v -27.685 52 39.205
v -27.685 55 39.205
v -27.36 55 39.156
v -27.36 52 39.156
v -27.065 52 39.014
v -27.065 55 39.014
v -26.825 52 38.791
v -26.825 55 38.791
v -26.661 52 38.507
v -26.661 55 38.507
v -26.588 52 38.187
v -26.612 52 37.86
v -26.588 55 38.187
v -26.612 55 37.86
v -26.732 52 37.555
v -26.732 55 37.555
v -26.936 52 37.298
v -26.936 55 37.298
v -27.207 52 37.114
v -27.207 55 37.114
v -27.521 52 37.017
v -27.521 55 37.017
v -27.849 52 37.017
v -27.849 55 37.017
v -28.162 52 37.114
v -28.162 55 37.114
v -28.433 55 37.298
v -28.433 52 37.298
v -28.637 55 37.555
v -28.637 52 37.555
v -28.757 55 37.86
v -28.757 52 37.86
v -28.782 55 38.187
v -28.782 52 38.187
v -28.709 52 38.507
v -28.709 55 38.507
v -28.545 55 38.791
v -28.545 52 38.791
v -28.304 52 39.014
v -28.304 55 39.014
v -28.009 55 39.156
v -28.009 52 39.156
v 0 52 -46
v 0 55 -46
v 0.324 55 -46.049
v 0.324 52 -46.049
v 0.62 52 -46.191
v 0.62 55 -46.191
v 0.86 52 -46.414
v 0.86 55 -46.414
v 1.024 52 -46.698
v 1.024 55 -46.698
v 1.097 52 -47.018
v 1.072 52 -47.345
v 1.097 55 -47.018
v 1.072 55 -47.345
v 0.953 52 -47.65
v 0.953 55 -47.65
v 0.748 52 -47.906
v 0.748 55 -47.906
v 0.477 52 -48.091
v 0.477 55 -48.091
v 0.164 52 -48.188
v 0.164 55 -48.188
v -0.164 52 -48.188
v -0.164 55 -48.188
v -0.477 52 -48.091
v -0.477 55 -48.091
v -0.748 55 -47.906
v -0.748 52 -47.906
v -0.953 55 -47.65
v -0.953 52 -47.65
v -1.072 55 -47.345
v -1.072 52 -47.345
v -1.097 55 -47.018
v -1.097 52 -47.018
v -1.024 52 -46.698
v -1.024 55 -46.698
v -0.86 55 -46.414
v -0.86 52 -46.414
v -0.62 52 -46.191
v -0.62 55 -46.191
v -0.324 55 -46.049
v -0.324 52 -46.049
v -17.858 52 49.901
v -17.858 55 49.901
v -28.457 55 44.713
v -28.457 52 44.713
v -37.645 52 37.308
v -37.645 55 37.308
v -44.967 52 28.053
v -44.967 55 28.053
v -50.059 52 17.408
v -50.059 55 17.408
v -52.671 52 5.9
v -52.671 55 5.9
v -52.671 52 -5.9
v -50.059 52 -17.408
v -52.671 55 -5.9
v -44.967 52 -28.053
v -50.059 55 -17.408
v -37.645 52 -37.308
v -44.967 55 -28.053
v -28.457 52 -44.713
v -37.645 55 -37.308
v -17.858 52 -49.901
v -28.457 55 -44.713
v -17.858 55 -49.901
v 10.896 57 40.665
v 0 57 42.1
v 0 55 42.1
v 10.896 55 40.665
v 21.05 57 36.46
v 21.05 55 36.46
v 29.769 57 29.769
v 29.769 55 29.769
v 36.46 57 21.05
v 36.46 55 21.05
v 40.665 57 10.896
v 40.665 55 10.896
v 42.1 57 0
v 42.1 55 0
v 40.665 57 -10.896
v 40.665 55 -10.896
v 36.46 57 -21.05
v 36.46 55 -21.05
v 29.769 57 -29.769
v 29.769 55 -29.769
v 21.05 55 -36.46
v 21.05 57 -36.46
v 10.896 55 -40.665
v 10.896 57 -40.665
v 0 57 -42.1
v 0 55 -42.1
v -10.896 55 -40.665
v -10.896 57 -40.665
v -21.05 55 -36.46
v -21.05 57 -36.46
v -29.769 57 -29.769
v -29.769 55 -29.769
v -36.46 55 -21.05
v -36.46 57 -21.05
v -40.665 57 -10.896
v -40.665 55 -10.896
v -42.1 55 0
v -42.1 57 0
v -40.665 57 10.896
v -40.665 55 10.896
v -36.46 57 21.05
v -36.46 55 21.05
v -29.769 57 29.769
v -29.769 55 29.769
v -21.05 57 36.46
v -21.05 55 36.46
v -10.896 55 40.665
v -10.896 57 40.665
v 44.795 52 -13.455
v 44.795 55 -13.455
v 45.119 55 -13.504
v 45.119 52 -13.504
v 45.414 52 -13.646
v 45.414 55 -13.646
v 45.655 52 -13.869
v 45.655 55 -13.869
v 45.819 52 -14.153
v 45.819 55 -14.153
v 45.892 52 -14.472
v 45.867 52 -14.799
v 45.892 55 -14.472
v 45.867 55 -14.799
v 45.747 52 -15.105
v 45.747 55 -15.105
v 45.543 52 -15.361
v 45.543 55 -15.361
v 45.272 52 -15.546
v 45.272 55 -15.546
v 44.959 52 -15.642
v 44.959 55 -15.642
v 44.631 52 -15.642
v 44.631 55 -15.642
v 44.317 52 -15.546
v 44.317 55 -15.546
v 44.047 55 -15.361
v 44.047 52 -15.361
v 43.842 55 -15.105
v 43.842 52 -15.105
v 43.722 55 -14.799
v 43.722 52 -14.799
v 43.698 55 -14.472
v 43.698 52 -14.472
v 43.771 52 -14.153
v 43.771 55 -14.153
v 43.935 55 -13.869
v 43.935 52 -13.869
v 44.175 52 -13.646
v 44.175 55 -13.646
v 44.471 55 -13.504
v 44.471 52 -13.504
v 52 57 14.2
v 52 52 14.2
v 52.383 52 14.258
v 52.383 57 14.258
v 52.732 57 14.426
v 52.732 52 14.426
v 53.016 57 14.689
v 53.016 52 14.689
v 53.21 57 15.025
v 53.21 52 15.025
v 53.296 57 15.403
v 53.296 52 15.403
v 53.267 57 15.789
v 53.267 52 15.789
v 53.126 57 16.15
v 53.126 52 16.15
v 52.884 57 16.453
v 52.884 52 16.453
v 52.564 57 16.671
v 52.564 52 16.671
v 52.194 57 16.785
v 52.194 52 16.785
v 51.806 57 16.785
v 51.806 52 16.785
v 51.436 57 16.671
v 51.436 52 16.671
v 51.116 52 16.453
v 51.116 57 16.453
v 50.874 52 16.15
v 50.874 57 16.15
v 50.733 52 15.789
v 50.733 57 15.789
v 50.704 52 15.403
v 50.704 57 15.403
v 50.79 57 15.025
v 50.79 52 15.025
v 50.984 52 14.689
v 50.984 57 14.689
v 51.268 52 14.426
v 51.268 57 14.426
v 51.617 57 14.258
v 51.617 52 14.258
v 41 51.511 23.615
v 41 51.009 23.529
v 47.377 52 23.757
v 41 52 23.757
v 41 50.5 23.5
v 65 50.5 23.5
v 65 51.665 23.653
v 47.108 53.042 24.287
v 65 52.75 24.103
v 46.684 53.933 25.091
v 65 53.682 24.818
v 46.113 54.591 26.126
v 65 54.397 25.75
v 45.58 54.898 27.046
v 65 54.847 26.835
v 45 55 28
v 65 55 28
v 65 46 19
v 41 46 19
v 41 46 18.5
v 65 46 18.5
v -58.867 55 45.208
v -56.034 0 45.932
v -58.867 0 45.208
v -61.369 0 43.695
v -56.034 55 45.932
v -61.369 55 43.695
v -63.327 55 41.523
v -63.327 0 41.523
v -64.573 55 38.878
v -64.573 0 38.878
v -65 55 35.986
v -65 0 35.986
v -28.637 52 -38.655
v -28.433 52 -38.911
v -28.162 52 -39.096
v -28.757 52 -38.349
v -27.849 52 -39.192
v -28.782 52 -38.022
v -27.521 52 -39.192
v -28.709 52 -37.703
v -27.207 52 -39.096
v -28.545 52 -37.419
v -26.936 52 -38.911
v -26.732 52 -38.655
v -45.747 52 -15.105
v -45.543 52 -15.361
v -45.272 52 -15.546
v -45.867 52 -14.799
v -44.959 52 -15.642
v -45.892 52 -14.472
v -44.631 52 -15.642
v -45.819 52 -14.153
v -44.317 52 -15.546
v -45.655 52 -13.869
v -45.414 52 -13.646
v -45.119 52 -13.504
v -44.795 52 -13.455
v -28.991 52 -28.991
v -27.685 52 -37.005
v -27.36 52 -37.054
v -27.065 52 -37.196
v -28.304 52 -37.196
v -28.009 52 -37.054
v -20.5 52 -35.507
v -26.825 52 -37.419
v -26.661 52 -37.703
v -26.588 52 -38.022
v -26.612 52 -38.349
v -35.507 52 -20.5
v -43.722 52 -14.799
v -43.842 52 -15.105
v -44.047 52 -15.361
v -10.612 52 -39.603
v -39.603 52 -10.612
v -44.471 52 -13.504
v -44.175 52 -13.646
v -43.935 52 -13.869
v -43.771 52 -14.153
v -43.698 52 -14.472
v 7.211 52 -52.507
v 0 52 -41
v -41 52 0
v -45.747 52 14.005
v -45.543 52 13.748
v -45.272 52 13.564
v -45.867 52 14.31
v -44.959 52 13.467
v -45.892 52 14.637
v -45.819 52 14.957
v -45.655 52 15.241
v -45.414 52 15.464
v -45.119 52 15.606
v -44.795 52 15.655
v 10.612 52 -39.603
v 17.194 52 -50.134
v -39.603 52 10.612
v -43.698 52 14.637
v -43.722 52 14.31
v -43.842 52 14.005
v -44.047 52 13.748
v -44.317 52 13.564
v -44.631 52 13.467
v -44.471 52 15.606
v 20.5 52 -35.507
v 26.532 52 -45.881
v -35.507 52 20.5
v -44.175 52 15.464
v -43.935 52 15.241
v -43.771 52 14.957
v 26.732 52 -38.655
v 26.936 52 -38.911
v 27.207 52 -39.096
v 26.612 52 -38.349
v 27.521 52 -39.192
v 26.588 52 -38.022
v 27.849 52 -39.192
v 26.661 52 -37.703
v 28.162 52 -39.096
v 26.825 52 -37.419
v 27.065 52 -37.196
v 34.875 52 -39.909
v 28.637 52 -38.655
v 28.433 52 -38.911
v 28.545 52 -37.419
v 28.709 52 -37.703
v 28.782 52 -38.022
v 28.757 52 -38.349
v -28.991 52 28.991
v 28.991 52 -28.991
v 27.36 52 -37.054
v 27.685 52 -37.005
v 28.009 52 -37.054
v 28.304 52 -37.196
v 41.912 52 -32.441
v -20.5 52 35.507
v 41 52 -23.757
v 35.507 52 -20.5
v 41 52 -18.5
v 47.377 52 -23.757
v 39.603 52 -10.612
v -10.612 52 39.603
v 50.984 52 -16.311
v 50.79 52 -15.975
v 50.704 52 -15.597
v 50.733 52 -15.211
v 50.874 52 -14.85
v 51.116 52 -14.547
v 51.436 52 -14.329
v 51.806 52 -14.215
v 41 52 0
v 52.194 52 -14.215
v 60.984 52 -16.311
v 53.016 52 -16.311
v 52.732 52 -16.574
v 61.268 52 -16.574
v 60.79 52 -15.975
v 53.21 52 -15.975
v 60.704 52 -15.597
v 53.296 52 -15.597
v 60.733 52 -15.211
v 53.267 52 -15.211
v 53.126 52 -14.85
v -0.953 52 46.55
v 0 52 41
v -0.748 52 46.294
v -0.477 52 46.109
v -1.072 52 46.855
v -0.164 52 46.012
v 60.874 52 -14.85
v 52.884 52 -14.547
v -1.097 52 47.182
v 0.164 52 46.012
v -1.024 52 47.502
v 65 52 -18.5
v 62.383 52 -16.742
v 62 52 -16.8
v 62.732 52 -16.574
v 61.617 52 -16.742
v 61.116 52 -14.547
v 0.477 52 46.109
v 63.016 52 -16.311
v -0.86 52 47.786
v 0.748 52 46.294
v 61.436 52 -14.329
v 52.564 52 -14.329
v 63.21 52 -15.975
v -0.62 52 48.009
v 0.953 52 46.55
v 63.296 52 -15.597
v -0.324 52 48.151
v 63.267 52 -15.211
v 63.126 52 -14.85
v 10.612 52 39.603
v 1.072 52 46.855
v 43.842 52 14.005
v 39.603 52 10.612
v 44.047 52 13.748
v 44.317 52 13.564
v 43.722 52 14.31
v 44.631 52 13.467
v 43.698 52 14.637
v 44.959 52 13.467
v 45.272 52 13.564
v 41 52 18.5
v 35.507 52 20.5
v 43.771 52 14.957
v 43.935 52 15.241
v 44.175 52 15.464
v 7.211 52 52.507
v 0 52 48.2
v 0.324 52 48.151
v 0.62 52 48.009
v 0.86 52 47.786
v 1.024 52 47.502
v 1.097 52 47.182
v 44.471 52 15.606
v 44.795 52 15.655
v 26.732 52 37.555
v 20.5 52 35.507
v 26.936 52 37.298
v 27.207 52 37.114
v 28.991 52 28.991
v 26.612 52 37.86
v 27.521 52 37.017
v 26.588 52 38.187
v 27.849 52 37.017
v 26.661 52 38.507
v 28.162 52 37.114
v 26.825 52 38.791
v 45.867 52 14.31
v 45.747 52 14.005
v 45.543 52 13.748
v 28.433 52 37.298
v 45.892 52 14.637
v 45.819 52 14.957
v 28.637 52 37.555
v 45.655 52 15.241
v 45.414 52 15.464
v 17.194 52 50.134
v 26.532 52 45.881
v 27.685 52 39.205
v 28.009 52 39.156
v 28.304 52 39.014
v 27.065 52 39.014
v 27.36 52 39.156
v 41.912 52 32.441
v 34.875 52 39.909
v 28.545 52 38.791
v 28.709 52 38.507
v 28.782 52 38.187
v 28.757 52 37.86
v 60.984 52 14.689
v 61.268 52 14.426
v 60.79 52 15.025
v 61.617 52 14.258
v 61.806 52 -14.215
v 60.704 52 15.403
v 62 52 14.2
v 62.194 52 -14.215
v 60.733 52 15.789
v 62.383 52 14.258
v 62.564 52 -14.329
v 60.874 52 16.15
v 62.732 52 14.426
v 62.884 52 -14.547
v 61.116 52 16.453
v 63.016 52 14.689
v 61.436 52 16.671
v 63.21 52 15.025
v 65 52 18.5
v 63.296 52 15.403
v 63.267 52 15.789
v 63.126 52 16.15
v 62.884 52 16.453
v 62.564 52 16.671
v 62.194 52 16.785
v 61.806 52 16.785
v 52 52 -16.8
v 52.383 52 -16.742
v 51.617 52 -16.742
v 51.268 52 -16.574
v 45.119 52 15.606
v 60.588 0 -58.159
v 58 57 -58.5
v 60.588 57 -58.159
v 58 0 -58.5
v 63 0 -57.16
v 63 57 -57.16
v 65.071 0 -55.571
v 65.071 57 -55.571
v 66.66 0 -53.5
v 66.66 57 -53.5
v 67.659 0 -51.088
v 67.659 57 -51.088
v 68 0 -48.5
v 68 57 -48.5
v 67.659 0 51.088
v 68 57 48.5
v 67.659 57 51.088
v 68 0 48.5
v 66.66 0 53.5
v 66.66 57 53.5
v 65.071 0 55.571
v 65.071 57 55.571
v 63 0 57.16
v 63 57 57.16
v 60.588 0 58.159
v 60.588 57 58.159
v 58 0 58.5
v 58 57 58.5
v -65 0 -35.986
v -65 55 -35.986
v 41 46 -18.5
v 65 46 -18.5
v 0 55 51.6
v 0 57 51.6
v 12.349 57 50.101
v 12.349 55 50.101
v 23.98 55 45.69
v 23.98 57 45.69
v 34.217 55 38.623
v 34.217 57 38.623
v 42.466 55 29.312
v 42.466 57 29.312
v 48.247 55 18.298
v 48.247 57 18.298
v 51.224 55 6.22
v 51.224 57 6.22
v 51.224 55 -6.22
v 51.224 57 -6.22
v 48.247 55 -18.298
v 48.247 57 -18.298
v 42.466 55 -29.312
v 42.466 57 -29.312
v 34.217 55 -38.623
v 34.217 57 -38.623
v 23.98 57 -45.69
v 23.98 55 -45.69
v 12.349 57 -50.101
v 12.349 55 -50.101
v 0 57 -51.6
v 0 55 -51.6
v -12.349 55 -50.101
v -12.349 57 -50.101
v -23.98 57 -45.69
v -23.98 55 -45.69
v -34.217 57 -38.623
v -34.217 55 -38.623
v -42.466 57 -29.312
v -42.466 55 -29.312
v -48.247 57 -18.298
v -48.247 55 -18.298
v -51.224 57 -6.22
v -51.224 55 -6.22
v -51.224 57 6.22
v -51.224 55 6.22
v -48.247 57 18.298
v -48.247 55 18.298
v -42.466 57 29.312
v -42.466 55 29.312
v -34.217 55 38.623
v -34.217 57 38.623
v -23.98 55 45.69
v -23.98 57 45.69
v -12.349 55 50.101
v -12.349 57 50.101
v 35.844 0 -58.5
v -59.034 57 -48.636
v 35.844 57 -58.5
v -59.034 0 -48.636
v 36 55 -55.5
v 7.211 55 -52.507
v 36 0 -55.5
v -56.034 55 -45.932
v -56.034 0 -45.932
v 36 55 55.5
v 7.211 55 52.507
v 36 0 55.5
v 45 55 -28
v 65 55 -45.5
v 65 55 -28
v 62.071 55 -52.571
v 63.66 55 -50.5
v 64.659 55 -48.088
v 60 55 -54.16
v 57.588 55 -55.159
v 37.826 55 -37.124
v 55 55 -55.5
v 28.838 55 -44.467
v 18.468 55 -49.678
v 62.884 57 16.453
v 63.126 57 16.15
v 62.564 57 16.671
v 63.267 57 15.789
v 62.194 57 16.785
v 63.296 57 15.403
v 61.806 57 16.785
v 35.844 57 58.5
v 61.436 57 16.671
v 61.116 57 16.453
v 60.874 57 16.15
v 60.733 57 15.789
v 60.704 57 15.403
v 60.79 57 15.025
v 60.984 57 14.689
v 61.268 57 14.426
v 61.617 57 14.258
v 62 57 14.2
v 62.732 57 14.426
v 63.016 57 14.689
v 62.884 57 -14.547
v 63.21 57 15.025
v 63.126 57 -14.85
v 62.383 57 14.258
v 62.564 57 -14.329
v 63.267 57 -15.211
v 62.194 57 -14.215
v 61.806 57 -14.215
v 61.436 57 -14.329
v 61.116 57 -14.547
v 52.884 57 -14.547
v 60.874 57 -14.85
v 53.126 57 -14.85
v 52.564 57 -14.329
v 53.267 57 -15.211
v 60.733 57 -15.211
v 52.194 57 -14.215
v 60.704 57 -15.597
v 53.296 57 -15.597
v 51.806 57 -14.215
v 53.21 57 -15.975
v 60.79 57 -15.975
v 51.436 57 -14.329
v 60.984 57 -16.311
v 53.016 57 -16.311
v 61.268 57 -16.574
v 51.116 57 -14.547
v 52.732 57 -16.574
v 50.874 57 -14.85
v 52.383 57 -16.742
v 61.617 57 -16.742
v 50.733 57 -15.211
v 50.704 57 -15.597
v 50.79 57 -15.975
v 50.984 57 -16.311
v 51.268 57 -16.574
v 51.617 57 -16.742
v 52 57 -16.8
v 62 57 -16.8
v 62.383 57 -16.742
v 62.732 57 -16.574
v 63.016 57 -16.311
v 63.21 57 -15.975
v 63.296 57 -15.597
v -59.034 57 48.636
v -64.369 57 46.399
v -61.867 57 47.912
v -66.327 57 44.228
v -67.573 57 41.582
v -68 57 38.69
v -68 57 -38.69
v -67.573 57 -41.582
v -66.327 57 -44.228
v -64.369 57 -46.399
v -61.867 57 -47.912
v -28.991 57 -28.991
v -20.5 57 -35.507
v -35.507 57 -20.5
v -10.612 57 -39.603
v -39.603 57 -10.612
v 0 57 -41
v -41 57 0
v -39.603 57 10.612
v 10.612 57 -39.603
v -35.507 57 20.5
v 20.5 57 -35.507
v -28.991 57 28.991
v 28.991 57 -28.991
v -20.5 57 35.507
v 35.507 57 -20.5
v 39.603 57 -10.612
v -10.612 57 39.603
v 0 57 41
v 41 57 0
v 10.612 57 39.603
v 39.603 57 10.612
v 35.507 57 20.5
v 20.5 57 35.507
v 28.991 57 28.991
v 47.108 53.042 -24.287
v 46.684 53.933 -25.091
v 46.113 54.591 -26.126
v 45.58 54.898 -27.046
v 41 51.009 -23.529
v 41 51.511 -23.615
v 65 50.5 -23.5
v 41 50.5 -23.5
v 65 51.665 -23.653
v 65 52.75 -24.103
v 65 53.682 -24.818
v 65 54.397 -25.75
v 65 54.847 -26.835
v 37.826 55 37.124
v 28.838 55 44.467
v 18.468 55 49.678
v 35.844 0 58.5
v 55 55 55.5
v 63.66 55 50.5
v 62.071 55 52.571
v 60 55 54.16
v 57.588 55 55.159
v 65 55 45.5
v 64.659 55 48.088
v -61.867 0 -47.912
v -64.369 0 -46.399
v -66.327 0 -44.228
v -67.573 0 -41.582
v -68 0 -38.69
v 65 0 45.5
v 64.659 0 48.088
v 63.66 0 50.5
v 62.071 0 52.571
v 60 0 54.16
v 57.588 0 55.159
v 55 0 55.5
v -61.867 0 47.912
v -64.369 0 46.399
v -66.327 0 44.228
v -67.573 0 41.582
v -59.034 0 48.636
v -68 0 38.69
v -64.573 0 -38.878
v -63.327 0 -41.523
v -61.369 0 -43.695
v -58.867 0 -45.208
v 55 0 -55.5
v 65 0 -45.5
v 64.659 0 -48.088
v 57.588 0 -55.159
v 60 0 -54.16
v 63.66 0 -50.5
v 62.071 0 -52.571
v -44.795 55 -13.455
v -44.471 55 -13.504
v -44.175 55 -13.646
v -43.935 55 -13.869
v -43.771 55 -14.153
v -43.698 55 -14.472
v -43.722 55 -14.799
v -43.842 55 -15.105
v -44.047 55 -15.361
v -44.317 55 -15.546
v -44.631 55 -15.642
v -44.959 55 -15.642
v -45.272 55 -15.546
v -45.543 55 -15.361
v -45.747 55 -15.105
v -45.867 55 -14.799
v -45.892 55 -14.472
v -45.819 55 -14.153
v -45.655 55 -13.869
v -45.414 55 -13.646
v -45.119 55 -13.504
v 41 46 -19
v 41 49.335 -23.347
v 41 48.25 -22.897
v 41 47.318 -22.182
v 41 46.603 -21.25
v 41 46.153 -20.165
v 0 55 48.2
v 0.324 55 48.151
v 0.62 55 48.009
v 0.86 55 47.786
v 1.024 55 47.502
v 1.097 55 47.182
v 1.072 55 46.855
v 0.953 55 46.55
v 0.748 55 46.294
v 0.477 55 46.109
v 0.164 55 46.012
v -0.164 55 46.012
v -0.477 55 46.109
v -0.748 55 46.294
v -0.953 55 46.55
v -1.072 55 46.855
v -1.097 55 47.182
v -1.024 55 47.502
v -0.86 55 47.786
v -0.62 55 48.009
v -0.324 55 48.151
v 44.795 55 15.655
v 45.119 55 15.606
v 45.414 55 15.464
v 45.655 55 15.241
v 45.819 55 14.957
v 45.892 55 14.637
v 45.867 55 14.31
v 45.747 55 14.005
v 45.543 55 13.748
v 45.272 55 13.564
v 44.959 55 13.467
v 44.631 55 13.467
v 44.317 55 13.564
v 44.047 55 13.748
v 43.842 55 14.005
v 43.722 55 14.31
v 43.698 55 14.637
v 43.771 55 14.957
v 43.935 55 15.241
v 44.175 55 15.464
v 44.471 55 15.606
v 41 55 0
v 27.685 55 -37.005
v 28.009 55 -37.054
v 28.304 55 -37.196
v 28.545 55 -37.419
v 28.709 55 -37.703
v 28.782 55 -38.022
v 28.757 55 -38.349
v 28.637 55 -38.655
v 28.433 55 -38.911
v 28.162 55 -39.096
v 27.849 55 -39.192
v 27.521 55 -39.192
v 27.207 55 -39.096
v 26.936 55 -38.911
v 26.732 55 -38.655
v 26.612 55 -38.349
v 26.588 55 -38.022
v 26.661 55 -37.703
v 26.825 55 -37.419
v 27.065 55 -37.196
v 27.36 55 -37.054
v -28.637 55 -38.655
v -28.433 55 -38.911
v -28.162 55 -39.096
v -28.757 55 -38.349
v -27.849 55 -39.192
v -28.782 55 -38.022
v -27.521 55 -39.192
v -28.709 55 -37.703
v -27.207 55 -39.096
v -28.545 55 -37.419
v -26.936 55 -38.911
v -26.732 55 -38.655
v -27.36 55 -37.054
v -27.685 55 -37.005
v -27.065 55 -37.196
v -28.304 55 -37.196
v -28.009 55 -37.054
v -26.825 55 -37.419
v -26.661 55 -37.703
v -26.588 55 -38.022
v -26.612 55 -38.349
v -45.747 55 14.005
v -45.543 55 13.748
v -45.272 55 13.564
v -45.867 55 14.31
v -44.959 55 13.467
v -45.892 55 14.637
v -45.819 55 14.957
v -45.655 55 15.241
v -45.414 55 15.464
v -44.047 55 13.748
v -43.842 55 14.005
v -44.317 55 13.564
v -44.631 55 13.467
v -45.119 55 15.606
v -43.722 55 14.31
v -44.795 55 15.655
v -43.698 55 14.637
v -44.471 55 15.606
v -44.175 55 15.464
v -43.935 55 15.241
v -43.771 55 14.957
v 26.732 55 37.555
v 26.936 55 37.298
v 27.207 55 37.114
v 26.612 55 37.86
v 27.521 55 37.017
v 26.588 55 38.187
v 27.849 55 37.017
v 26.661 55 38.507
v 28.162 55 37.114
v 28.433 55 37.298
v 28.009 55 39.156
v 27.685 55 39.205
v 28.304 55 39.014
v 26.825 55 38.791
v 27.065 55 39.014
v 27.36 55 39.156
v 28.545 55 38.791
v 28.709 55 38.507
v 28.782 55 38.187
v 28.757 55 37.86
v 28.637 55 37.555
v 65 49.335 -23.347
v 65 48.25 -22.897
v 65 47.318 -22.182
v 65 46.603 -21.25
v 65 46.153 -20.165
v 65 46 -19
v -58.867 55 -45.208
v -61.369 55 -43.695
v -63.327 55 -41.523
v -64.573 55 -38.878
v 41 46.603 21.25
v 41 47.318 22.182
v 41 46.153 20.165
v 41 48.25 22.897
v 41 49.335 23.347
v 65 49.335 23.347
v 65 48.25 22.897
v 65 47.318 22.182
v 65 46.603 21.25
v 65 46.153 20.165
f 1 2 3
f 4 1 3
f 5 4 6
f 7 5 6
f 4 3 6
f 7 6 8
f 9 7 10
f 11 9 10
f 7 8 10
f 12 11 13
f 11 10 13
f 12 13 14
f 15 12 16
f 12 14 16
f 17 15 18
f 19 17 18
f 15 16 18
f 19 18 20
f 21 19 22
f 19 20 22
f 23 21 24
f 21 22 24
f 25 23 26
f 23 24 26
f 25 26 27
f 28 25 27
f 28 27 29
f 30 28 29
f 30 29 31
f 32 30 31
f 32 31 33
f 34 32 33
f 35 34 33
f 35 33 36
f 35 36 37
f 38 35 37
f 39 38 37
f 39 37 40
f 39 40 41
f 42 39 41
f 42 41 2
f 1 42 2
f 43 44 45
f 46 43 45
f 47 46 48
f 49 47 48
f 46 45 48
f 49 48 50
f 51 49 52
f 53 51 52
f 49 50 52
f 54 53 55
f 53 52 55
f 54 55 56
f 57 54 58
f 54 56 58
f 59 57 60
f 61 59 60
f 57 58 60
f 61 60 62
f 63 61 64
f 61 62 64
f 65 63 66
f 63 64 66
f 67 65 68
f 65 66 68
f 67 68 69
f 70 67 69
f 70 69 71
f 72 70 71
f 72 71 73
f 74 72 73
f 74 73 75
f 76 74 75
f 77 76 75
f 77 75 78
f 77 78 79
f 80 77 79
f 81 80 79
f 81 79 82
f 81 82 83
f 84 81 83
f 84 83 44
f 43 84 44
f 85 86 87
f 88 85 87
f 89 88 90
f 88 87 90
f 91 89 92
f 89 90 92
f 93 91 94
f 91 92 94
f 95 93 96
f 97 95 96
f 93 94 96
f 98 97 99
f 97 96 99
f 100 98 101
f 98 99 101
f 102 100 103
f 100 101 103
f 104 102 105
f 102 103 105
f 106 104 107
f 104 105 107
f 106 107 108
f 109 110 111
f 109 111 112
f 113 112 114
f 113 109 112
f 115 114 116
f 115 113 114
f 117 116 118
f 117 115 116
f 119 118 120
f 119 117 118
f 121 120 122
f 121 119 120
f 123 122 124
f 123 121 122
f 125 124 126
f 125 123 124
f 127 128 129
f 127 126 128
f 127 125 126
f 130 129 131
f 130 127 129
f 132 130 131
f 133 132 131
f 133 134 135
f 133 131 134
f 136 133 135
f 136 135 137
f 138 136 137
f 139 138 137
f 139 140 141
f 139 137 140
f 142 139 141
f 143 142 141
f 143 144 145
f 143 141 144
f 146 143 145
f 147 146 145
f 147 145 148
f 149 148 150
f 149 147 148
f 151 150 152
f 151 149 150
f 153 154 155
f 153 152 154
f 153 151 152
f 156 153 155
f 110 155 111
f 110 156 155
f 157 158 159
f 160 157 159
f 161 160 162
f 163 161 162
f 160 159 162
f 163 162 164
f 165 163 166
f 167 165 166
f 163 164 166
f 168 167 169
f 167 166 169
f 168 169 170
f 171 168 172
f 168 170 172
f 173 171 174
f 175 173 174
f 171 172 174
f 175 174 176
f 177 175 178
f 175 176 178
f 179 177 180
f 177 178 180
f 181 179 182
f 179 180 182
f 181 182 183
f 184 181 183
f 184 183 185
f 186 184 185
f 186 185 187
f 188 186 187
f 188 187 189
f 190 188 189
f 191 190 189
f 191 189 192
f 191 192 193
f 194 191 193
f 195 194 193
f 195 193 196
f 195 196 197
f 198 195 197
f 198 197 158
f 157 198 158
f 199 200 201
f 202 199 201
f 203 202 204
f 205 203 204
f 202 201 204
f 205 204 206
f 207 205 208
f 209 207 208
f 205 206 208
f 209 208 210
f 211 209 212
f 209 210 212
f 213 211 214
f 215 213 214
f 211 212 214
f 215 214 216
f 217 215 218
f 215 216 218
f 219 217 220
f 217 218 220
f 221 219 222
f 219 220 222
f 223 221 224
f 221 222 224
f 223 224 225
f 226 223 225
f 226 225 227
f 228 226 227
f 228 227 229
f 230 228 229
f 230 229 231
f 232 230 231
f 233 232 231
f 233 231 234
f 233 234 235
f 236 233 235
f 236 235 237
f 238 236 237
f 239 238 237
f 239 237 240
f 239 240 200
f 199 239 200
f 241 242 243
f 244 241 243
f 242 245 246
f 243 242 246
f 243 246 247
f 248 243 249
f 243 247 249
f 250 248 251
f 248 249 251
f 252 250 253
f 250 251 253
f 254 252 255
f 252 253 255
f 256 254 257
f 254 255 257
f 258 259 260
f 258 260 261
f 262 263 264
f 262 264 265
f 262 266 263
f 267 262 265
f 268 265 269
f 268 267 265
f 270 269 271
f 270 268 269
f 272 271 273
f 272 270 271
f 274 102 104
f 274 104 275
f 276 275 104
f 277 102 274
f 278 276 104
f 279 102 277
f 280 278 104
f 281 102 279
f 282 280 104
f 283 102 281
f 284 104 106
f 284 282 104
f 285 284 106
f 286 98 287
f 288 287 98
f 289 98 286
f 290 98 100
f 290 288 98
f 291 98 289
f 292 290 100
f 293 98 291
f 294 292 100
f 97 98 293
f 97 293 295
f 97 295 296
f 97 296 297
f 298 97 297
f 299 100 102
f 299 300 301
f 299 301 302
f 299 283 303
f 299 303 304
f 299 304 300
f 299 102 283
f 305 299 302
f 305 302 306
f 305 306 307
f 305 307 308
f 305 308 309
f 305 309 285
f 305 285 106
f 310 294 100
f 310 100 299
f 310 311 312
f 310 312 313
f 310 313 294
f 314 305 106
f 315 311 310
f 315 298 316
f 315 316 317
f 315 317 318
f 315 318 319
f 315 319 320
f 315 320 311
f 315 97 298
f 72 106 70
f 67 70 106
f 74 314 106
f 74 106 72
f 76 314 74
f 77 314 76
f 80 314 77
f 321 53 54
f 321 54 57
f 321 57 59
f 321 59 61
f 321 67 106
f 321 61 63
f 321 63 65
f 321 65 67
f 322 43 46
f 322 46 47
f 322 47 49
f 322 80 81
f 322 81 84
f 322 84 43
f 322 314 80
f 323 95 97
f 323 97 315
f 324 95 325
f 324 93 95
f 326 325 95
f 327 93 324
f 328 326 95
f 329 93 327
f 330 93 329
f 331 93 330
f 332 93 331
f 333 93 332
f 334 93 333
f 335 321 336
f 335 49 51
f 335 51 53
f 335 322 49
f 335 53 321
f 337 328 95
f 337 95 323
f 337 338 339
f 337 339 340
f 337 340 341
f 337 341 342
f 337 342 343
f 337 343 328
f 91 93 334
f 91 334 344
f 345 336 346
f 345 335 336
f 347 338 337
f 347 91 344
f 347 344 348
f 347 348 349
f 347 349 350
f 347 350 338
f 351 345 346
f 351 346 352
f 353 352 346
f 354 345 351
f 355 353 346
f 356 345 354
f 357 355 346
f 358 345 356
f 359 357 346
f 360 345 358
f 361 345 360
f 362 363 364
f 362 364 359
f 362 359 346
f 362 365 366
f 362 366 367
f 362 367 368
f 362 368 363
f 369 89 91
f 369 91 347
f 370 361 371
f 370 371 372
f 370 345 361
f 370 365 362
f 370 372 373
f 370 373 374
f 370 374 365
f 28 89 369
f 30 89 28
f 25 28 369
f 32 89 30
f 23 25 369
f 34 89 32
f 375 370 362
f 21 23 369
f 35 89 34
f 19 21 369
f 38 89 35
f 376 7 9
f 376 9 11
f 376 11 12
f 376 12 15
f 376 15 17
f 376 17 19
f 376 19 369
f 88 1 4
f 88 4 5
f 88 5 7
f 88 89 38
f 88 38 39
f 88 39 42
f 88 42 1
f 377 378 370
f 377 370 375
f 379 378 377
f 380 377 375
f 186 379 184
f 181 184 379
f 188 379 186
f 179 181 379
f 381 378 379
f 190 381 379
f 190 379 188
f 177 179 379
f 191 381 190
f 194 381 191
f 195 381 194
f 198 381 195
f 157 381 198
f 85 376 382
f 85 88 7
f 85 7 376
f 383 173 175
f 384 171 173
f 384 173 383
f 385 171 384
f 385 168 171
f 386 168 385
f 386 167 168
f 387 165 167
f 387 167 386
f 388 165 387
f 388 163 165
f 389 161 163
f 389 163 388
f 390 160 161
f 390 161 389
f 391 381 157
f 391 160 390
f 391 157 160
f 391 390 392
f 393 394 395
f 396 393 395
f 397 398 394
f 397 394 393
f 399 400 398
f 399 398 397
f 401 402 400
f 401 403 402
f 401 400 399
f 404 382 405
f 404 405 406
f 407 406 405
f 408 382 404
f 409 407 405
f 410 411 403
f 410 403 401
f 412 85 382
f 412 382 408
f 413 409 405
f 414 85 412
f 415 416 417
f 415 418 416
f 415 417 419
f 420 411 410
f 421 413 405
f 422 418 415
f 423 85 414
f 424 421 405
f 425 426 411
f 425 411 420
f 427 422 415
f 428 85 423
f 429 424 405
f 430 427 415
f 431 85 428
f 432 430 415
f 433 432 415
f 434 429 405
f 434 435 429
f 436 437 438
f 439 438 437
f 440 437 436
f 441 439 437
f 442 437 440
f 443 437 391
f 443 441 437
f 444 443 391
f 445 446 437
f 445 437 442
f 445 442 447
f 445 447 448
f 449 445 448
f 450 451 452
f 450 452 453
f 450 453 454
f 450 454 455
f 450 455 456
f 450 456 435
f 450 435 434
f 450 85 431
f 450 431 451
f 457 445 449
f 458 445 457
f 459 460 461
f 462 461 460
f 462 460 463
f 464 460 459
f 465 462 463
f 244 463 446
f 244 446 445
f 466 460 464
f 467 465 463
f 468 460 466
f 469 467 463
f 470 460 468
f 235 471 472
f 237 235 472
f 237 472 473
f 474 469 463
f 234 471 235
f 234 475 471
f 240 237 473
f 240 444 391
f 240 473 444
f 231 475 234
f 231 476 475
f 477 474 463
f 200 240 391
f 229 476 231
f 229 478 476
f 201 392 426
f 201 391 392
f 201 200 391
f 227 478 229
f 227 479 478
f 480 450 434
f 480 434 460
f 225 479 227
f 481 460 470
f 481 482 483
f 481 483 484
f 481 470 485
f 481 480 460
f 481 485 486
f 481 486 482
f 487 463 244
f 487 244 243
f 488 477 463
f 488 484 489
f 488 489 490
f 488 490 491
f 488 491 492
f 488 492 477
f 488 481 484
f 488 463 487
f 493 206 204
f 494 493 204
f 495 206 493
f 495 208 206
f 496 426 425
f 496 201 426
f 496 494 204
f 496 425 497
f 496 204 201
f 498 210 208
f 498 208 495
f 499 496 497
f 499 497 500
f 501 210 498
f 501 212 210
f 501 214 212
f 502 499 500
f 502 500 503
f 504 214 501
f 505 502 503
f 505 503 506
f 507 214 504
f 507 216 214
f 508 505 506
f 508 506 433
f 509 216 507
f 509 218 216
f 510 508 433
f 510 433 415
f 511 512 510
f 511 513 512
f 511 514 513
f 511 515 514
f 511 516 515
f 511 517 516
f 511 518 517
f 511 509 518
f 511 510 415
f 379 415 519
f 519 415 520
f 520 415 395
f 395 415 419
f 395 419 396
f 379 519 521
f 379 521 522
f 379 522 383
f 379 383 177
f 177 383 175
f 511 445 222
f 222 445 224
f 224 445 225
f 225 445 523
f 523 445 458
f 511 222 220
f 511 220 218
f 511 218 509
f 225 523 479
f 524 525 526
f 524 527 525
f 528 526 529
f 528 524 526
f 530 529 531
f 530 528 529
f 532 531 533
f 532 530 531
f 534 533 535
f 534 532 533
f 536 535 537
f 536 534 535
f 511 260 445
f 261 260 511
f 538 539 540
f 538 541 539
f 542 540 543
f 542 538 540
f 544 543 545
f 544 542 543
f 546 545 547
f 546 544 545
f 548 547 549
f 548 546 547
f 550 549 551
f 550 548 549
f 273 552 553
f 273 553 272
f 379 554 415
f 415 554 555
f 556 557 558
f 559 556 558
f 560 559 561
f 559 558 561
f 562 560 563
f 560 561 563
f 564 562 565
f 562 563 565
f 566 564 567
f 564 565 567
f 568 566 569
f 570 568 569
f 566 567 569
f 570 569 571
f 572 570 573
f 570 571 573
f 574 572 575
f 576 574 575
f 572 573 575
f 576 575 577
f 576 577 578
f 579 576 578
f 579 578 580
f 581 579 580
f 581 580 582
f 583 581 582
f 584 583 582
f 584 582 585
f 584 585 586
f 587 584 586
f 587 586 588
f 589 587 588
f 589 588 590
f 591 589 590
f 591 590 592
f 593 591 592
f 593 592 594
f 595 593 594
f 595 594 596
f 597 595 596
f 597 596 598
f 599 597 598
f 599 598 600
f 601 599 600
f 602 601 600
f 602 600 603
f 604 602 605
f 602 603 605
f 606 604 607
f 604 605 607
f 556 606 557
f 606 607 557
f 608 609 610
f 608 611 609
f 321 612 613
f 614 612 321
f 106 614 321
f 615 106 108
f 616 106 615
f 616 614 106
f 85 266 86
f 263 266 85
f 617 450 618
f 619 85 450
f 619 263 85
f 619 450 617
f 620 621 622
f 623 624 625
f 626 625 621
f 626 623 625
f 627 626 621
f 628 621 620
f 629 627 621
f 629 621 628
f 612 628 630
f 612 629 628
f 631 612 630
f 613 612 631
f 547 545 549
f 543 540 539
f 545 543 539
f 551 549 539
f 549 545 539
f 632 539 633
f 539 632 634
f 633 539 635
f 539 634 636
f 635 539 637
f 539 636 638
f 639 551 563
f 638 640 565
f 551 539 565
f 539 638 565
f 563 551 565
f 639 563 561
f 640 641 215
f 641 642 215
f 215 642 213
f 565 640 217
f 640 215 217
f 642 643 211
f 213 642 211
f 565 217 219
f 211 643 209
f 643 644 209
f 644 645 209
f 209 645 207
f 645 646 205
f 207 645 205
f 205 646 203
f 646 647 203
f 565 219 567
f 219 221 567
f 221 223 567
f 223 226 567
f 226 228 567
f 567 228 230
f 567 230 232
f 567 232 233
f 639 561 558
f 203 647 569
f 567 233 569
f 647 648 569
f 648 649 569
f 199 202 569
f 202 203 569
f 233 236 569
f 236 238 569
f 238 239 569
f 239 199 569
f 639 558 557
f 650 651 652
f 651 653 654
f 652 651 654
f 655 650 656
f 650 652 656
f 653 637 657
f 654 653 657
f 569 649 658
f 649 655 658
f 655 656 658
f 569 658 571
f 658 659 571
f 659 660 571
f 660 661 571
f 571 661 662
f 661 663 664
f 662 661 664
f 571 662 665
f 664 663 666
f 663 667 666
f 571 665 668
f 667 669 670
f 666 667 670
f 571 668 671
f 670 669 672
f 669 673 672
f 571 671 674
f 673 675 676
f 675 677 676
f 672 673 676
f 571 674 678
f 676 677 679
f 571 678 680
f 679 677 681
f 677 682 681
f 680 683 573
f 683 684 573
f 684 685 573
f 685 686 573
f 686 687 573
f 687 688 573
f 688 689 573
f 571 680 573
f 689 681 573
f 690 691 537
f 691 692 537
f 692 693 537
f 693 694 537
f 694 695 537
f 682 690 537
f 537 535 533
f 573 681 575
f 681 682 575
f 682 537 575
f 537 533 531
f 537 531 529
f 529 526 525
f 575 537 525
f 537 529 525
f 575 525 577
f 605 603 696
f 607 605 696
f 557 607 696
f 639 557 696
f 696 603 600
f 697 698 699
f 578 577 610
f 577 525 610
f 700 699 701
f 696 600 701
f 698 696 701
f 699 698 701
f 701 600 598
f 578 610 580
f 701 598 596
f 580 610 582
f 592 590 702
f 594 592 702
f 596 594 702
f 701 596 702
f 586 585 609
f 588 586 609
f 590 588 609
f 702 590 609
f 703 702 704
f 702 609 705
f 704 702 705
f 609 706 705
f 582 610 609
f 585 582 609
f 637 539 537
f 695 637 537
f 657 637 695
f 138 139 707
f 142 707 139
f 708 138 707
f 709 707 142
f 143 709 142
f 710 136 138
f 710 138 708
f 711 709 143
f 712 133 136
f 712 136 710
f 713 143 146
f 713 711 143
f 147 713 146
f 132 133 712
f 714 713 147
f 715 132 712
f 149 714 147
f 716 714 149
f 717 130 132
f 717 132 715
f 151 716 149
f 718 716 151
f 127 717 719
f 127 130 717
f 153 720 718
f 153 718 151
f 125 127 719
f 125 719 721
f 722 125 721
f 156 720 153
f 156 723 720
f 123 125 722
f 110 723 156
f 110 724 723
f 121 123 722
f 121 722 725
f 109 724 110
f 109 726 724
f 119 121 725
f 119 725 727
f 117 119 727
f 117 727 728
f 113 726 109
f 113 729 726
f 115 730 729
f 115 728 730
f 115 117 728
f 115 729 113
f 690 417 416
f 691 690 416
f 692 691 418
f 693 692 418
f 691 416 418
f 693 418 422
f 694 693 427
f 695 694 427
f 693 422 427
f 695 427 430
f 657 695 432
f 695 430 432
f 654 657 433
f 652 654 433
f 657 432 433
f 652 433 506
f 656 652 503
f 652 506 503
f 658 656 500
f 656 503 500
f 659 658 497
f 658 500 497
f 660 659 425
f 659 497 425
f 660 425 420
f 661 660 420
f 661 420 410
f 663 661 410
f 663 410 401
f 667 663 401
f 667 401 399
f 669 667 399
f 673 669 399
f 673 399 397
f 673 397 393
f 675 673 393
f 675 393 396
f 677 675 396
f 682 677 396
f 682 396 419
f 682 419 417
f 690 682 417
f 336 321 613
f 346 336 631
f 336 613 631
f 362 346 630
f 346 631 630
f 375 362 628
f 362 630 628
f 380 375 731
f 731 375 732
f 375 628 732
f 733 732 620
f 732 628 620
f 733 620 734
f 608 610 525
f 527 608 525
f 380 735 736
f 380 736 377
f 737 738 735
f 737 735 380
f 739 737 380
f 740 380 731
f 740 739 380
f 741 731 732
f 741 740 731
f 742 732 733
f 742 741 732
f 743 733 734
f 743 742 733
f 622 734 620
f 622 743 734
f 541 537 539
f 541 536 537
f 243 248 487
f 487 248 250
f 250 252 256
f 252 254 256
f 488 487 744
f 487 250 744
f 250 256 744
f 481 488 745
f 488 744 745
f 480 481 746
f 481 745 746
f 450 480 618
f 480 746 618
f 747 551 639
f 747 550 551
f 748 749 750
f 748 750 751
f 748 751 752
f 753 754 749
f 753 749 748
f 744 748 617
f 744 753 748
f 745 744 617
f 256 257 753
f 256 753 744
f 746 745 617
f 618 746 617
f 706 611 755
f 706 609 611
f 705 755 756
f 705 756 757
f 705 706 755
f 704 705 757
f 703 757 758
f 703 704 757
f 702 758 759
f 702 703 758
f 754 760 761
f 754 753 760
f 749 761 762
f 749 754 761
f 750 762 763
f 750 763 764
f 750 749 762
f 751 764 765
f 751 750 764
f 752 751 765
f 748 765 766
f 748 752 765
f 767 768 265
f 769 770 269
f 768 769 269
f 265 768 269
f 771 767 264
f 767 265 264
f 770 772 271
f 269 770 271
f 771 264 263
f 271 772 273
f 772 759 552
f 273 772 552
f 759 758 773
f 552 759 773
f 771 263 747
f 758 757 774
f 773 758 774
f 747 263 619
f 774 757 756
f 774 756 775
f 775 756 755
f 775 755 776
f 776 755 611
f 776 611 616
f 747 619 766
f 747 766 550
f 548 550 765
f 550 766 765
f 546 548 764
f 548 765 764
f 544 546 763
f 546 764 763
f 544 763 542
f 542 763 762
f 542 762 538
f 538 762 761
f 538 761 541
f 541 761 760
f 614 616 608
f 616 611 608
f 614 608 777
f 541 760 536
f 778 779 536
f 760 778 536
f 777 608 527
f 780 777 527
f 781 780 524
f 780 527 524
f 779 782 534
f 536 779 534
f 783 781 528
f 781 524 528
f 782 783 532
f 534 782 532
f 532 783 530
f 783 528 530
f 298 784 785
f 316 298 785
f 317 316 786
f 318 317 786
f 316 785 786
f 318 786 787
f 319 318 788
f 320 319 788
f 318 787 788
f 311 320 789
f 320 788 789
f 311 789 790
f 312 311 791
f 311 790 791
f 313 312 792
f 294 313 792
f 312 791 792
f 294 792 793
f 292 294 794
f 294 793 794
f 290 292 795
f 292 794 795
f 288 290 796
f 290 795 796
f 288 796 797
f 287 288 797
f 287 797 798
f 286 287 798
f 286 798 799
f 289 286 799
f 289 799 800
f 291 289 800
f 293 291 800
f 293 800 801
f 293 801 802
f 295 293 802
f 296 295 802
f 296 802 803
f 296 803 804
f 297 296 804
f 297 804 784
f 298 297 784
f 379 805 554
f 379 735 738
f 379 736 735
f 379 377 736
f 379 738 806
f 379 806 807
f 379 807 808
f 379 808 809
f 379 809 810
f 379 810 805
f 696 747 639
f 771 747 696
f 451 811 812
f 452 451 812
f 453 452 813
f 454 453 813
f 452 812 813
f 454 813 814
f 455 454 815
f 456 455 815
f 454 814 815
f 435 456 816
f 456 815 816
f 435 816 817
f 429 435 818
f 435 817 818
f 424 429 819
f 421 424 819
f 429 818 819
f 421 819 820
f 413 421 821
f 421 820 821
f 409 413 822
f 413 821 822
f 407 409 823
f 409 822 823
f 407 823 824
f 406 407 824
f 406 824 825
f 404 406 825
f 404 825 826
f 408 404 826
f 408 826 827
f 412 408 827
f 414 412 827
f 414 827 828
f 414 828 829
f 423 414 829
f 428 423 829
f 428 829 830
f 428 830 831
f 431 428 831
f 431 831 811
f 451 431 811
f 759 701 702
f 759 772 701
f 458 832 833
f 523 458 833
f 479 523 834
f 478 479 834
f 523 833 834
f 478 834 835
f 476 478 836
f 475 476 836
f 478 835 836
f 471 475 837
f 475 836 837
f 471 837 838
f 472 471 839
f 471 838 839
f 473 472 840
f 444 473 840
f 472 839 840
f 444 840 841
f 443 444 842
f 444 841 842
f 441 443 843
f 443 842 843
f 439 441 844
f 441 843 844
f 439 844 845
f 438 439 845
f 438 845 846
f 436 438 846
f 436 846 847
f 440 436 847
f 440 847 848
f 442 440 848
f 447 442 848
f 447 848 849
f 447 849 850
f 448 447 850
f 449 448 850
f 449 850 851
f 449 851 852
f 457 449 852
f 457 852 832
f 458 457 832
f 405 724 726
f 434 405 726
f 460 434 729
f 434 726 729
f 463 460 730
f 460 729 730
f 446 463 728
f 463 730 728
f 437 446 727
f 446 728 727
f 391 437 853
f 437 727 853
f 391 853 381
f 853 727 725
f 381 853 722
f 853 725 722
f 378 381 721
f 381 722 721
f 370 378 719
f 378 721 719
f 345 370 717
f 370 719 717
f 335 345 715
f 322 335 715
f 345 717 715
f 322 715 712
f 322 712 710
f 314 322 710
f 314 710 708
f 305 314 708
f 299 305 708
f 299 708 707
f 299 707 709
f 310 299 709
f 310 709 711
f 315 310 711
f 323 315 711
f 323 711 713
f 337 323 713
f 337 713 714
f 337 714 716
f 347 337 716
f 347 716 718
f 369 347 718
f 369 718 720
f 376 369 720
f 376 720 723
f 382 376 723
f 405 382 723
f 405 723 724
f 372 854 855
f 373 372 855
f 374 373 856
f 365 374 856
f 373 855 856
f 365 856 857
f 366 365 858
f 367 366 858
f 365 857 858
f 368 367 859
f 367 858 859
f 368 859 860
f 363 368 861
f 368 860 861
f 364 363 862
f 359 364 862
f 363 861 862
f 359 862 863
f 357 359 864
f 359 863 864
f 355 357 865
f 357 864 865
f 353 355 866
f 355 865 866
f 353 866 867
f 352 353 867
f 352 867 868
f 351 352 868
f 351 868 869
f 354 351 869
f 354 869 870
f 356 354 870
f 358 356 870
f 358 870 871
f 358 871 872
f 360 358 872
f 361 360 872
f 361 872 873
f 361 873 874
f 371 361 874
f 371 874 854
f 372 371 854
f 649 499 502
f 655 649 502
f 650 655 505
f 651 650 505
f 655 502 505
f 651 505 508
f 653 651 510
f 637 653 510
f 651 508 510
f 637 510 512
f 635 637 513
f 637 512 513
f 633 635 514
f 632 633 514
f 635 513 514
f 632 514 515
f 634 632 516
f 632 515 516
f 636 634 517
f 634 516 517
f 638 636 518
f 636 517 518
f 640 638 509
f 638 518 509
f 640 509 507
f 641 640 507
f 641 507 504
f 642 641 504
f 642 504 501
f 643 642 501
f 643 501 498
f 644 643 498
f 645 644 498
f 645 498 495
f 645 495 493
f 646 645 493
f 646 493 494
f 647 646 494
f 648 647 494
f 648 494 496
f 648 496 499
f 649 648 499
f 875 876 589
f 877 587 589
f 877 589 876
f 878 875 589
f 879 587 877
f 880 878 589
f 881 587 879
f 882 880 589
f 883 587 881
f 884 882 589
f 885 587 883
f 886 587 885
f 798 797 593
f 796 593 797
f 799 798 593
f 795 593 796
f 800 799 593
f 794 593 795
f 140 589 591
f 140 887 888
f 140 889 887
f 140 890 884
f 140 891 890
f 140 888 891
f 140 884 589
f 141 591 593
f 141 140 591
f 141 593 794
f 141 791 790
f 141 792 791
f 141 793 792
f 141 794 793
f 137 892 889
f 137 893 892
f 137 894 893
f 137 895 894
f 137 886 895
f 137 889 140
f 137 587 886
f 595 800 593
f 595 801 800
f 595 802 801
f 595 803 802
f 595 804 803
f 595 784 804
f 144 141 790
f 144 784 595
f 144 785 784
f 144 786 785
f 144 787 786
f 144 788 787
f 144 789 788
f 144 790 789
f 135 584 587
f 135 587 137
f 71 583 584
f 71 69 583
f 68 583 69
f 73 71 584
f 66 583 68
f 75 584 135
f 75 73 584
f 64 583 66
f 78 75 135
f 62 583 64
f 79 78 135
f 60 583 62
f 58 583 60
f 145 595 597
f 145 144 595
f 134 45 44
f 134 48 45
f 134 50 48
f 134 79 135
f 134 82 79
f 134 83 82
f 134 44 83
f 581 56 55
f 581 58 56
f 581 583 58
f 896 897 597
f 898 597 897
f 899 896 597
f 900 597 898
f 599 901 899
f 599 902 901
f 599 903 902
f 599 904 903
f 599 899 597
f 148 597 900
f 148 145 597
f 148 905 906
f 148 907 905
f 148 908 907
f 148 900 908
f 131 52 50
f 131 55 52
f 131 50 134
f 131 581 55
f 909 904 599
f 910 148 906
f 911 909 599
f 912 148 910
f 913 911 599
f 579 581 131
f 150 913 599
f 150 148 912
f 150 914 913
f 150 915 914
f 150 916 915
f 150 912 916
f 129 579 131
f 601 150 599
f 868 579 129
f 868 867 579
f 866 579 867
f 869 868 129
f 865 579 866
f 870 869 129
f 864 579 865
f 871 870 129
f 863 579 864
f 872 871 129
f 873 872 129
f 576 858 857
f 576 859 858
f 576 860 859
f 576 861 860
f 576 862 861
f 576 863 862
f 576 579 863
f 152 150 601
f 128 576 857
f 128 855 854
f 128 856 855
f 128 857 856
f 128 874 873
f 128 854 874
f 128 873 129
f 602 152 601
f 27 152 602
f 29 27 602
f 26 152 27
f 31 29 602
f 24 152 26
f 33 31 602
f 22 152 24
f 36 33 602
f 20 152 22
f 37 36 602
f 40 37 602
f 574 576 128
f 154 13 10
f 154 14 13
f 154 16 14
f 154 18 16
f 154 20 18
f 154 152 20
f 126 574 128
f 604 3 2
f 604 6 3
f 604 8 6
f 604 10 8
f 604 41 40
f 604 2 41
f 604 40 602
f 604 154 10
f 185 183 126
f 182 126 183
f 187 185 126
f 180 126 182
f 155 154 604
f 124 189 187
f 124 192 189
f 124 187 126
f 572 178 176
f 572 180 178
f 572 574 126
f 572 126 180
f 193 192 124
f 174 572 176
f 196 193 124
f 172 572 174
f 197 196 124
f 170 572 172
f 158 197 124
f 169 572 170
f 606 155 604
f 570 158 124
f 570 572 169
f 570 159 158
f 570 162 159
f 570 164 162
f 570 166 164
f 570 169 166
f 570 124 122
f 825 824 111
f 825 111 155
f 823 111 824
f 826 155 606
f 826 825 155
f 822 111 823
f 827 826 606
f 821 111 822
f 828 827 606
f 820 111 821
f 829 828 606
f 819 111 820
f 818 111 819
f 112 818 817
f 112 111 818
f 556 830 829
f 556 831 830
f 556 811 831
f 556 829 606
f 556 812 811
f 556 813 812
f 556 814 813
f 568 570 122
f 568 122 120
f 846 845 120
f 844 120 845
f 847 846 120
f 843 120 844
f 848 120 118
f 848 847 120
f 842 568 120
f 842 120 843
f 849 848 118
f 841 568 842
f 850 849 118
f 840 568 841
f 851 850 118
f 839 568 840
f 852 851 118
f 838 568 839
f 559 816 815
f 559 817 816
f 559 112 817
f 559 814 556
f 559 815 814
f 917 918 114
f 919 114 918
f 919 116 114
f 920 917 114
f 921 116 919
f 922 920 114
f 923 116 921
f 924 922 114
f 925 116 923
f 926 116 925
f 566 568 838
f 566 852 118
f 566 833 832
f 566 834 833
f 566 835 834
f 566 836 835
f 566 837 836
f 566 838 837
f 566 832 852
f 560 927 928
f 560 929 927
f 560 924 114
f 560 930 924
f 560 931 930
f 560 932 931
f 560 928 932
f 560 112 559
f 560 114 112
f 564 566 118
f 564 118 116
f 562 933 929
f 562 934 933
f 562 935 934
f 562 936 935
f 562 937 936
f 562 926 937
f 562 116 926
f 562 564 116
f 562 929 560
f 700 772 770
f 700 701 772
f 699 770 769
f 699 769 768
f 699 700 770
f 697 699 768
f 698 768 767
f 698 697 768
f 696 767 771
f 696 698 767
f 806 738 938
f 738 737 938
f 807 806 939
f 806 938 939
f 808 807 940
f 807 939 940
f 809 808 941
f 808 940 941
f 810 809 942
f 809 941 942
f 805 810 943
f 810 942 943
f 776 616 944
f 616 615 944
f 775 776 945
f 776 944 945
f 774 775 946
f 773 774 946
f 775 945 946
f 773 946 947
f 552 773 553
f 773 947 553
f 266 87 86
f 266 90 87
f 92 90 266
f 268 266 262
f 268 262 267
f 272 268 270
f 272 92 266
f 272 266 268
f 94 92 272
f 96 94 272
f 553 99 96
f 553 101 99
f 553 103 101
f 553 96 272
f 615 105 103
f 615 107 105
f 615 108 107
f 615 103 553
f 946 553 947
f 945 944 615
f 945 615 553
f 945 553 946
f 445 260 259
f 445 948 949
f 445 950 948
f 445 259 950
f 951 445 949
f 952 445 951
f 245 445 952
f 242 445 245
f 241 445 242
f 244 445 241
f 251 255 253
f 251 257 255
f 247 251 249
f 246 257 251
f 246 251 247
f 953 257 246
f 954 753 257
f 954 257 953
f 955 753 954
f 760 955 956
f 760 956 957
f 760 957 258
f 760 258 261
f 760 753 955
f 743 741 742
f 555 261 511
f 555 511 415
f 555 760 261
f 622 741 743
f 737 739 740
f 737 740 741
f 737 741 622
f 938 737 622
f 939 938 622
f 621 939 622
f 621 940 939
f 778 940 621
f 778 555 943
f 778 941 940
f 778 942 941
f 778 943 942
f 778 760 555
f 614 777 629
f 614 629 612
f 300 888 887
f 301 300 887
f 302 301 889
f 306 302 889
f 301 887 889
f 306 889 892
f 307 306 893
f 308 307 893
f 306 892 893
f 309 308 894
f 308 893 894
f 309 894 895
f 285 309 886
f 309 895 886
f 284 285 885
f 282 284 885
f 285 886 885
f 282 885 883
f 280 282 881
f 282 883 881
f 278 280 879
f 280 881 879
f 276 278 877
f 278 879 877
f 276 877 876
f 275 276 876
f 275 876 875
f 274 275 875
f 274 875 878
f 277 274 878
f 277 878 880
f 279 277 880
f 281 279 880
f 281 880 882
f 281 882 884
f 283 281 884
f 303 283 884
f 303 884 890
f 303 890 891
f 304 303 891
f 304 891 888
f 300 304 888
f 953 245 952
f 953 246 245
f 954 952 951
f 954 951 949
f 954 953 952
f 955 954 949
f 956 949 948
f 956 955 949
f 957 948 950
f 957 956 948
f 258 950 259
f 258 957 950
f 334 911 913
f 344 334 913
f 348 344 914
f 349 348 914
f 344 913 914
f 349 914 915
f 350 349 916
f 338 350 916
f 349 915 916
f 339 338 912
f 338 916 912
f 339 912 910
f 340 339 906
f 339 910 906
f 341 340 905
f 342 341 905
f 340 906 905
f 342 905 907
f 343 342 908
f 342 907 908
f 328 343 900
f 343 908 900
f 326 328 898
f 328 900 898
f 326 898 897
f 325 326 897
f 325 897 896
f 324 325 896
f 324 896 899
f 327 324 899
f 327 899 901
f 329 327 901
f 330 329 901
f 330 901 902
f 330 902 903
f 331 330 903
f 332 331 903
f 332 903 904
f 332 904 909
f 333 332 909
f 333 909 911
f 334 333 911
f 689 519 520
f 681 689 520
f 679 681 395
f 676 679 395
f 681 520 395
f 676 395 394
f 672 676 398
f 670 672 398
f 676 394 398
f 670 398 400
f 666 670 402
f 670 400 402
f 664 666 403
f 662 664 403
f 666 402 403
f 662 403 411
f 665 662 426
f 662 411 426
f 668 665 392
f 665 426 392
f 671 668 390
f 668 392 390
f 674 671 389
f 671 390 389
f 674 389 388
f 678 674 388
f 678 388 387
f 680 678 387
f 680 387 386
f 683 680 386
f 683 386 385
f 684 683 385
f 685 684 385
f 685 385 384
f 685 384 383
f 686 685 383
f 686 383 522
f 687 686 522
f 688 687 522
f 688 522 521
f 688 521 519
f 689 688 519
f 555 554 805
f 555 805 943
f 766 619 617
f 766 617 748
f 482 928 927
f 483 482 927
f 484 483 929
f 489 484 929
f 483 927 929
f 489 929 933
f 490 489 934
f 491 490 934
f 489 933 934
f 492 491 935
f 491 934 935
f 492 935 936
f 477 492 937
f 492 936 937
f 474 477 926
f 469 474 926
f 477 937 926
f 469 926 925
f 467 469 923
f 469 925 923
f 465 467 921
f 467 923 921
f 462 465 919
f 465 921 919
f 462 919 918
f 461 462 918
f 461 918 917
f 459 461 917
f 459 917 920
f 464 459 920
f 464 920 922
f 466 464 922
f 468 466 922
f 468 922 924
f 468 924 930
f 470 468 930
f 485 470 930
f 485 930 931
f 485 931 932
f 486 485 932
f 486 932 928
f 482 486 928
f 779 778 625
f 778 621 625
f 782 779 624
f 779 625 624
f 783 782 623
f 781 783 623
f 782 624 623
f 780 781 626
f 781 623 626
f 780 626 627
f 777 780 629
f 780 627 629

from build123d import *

# Parameters (mm, degrees)
EXTRUDE_1_DEPTH     = 55
EXTRUDE_2_DEPTH     = 2
SKETCH_3_R          = 53
EXTRUDE_3_DEPTH     = 3
SKETCH_4_R          = 51.6
CUT_EXTRUDE_1_DEPTH = 2
SKETCH_5_R          = 41
CUT_EXTRUDE_2_DEPTH = 106.220007603
EXTRUDE_START       = 2
SKETCH_6_R          = 42.1
SKETCH_6_R_2        = 41
EXTRUDE_4_DEPTH     = 2
SKETCH_9_W          = 24
SKETCH_9_H          = 47
EXTRUDE_6_DEPTH     = 9
SKETCH_10_W         = 24
SKETCH_10_H         = 37
CUT_EXTRUDE_6_DEPTH = 6
SKETCH_7_R          = 1.1
CUT_EXTRUDE_3_DEPTH = 106.220007603
FILLET_1_R          = 10
CUT_EXTRUDE_7_REACH = 105.683
SKETCH_11_R         = 1.3
FILLET_2_R          = 4.5


with BuildPart() as part:
    # 스케치1 → 보스-돌출1 (new body)
    with BuildSketch(Plane(origin=(0, 0, 0), x_dir=(1, 0, 0), z_dir=(0, 1, 0))):
        Polygon((-68, -47.70428689), (35.844478487, -58.5), (68, -58.5), (68, 58.5), (35.844478487, 58.5), (-68, 47.70428689), align=None)
        Polygon((-65, -45), (36, -55.5), (65, -55.5), (65, 55.5), (36, 55.5), (-65, 45), align=None, mode=Mode.SUBTRACT)
    extrude(amount=EXTRUDE_1_DEPTH)

    # 스케치2 → 보스-돌출2 (add)
    with BuildSketch(Plane(origin=(0, 55, 0), x_dir=(1, 0, 0), z_dir=(0, 1, 0))):
        Polygon((-68, 47.70428689), (35.844478487, 58.5), (68, 58.5), (68, -58.5), (35.844478487, -58.5), (-68, -47.70428689), align=None)
    extrude(amount=EXTRUDE_2_DEPTH)

    # 스케치3 → 보스-돌출3 (add)
    with BuildSketch(Plane.XZ.offset(-55)):
        Circle(SKETCH_3_R)
    extrude(amount=EXTRUDE_3_DEPTH)

    # 스케치4 → 컷-돌출1 (cut)
    with BuildSketch(Plane(origin=(0, 57, 0), x_dir=(1, 0, 0), z_dir=(0, 1, 0))):
        with Locations(Location((0, 0, 0), (0, 0, 270))):
            Circle(SKETCH_4_R)
    extrude(amount=-CUT_EXTRUDE_1_DEPTH, mode=Mode.SUBTRACT)

    # 스케치5 → 컷-돌출2 (cut, through all)
    with BuildSketch(Plane(origin=(0, 55, 0), x_dir=(1, 0, 0), z_dir=(0, 1, 0))):
        with Locations(Location((0, 0, 0), (0, 0, 270))):
            Circle(SKETCH_5_R)
    extrude(amount=-CUT_EXTRUDE_2_DEPTH, mode=Mode.SUBTRACT)

    # 스케치6 → 보스-돌출4 (add)
    with BuildSketch(Plane(origin=(0, 55, 0), x_dir=(1, 0, 0), z_dir=(0, 1, 0)).offset(EXTRUDE_START)):
        with Locations(Location((0, 0, 0), (0, 0, 270))):
            Circle(SKETCH_6_R)
        with Locations(Location((0, 0, 0), (0, 0, 270))):
            Circle(SKETCH_6_R_2, mode=Mode.SUBTRACT)
    extrude(amount=-EXTRUDE_4_DEPTH)

    # 스케치9 → 보스-돌출6 (add)
    with BuildSketch(Plane.XZ.offset(-55)):
        with Locations((53, 0)):
            Rectangle(SKETCH_9_W, SKETCH_9_H)
    extrude(amount=EXTRUDE_6_DEPTH)

    # 스케치10 → 컷-돌출6 (cut)
    with BuildSketch(Plane.XZ.offset(-46)):
        with Locations((53, 0)):
            Rectangle(SKETCH_10_W, SKETCH_10_H)
    extrude(amount=-CUT_EXTRUDE_6_DEPTH, mode=Mode.SUBTRACT)

    # 스케치7 → 컷-돌출3 (cut, through all)
    with BuildSketch(Plane(origin=(0, 55, 0), x_dir=(1, 0, 0), z_dir=(0, 1, 0))):
        with Locations(Location((0, 47.1, 0), (0, 0, 270))):
            Circle(SKETCH_7_R)
        with Locations(Location((27.684685383, 38.104700435, 0), (0, 0, 270))):
            Circle(SKETCH_7_R)
        with Locations(Location((44.794761918, 14.554700435, 0), (0, 0, 270))):
            Circle(SKETCH_7_R)
        with Locations(Location((44.794761918, -14.554700435, 0), (0, 0, 270))):
            Circle(SKETCH_7_R)
        with Locations(Location((27.684685383, -38.104700435, 0), (0, 0, 270))):
            Circle(SKETCH_7_R)
        with Locations(Location((0, -47.1, 0), (0, 0, 270))):
            Circle(SKETCH_7_R)
        with Locations(Location((-27.684685383, -38.104700435, 0), (0, 0, 270))):
            Circle(SKETCH_7_R)
        with Locations(Location((-44.794761918, -14.554700435, 0), (0, 0, 270))):
            Circle(SKETCH_7_R)
        with Locations(Location((-44.794761918, 14.554700435, 0), (0, 0, 270))):
            Circle(SKETCH_7_R)
        with Locations(Location((-27.684685383, 38.104700435, 0), (0, 0, 270))):
            Circle(SKETCH_7_R)
    extrude(amount=-CUT_EXTRUDE_3_DEPTH, mode=Mode.SUBTRACT)

    # 필렛1
    fillet_1_edges = [part.edges().sort_by_distance(p)[0] for p in [
        (-68, 28.5, -47.70428689),
        (68, 28.5, -58.5),
        (68, 28.5, 58.5),
        (-68, 28.5, 47.70428689),
        (-65, 27.5, -45),
        (-65, 27.5, 45),
        (65, 27.5, 55.5),
        (65, 27.5, -55.5),
    ]]
    fillet(fillet_1_edges, radius=FILLET_1_R)

    # 스케치11 → 컷-돌출7 (cut, up to next)
    with BuildSketch(Plane.XZ.offset(-52), mode=Mode.PRIVATE) as cut_extrude_7_sk1:
        with Locations(Location((52, 15.5, 0), (0, 0, 270))):
            Circle(SKETCH_11_R)
    cut_extrude_7_tool1 = extrude(cut_extrude_7_sk1.sketch, amount=-CUT_EXTRUDE_7_REACH, mode=Mode.PRIVATE) & part.part
    # 스케치11 → 컷-돌출7 (cut, up to next)
    with BuildSketch(Plane.XZ.offset(-52), mode=Mode.PRIVATE) as cut_extrude_7_sk2:
        with Locations(Location((52, -15.5, 0), (0, 0, 270))):
            Circle(SKETCH_11_R)
    cut_extrude_7_tool2 = extrude(cut_extrude_7_sk2.sketch, amount=-CUT_EXTRUDE_7_REACH, mode=Mode.PRIVATE) & part.part
    # 스케치11 → 컷-돌출7 (cut, up to next)
    with BuildSketch(Plane.XZ.offset(-52), mode=Mode.PRIVATE) as cut_extrude_7_sk3:
        with Locations(Location((62, 15.5, 0), (0, 0, 270))):
            Circle(SKETCH_11_R)
    cut_extrude_7_tool3 = extrude(cut_extrude_7_sk3.sketch, amount=-CUT_EXTRUDE_7_REACH, mode=Mode.PRIVATE) & part.part
    # 스케치11 → 컷-돌출7 (cut, up to next)
    with BuildSketch(Plane.XZ.offset(-52), mode=Mode.PRIVATE) as cut_extrude_7_sk4:
        with Locations(Location((62, -15.5, 0), (0, 0, 270))):
            Circle(SKETCH_11_R)
    cut_extrude_7_tool4 = extrude(cut_extrude_7_sk4.sketch, amount=-CUT_EXTRUDE_7_REACH, mode=Mode.PRIVATE) & part.part
    add(cut_extrude_7_tool1.solids().sort_by_distance((52, 52, 15.5))[0], mode=Mode.SUBTRACT)
    add(cut_extrude_7_tool2.solids().sort_by_distance((52, 52, -15.5))[0], mode=Mode.SUBTRACT)
    add(cut_extrude_7_tool3.solids().sort_by_distance((62, 52, 15.5))[0], mode=Mode.SUBTRACT)
    add(cut_extrude_7_tool4.solids().sort_by_distance((62, 52, -15.5))[0], mode=Mode.SUBTRACT)

    # 필렛2
    fillet_2_edges = [part.edges().sort_by_distance(p)[0] for p in [
        (53, 46, 23.5),
        (53, 46, -23.5),
        (56.252631433, 55, -23.5),
        (56.252631433, 55, 23.5),
    ]]
    fillet(fillet_2_edges, radius=FILLET_2_R - 0.0001)  # a hair under: the kernel refuses the full size


solid = part.part
